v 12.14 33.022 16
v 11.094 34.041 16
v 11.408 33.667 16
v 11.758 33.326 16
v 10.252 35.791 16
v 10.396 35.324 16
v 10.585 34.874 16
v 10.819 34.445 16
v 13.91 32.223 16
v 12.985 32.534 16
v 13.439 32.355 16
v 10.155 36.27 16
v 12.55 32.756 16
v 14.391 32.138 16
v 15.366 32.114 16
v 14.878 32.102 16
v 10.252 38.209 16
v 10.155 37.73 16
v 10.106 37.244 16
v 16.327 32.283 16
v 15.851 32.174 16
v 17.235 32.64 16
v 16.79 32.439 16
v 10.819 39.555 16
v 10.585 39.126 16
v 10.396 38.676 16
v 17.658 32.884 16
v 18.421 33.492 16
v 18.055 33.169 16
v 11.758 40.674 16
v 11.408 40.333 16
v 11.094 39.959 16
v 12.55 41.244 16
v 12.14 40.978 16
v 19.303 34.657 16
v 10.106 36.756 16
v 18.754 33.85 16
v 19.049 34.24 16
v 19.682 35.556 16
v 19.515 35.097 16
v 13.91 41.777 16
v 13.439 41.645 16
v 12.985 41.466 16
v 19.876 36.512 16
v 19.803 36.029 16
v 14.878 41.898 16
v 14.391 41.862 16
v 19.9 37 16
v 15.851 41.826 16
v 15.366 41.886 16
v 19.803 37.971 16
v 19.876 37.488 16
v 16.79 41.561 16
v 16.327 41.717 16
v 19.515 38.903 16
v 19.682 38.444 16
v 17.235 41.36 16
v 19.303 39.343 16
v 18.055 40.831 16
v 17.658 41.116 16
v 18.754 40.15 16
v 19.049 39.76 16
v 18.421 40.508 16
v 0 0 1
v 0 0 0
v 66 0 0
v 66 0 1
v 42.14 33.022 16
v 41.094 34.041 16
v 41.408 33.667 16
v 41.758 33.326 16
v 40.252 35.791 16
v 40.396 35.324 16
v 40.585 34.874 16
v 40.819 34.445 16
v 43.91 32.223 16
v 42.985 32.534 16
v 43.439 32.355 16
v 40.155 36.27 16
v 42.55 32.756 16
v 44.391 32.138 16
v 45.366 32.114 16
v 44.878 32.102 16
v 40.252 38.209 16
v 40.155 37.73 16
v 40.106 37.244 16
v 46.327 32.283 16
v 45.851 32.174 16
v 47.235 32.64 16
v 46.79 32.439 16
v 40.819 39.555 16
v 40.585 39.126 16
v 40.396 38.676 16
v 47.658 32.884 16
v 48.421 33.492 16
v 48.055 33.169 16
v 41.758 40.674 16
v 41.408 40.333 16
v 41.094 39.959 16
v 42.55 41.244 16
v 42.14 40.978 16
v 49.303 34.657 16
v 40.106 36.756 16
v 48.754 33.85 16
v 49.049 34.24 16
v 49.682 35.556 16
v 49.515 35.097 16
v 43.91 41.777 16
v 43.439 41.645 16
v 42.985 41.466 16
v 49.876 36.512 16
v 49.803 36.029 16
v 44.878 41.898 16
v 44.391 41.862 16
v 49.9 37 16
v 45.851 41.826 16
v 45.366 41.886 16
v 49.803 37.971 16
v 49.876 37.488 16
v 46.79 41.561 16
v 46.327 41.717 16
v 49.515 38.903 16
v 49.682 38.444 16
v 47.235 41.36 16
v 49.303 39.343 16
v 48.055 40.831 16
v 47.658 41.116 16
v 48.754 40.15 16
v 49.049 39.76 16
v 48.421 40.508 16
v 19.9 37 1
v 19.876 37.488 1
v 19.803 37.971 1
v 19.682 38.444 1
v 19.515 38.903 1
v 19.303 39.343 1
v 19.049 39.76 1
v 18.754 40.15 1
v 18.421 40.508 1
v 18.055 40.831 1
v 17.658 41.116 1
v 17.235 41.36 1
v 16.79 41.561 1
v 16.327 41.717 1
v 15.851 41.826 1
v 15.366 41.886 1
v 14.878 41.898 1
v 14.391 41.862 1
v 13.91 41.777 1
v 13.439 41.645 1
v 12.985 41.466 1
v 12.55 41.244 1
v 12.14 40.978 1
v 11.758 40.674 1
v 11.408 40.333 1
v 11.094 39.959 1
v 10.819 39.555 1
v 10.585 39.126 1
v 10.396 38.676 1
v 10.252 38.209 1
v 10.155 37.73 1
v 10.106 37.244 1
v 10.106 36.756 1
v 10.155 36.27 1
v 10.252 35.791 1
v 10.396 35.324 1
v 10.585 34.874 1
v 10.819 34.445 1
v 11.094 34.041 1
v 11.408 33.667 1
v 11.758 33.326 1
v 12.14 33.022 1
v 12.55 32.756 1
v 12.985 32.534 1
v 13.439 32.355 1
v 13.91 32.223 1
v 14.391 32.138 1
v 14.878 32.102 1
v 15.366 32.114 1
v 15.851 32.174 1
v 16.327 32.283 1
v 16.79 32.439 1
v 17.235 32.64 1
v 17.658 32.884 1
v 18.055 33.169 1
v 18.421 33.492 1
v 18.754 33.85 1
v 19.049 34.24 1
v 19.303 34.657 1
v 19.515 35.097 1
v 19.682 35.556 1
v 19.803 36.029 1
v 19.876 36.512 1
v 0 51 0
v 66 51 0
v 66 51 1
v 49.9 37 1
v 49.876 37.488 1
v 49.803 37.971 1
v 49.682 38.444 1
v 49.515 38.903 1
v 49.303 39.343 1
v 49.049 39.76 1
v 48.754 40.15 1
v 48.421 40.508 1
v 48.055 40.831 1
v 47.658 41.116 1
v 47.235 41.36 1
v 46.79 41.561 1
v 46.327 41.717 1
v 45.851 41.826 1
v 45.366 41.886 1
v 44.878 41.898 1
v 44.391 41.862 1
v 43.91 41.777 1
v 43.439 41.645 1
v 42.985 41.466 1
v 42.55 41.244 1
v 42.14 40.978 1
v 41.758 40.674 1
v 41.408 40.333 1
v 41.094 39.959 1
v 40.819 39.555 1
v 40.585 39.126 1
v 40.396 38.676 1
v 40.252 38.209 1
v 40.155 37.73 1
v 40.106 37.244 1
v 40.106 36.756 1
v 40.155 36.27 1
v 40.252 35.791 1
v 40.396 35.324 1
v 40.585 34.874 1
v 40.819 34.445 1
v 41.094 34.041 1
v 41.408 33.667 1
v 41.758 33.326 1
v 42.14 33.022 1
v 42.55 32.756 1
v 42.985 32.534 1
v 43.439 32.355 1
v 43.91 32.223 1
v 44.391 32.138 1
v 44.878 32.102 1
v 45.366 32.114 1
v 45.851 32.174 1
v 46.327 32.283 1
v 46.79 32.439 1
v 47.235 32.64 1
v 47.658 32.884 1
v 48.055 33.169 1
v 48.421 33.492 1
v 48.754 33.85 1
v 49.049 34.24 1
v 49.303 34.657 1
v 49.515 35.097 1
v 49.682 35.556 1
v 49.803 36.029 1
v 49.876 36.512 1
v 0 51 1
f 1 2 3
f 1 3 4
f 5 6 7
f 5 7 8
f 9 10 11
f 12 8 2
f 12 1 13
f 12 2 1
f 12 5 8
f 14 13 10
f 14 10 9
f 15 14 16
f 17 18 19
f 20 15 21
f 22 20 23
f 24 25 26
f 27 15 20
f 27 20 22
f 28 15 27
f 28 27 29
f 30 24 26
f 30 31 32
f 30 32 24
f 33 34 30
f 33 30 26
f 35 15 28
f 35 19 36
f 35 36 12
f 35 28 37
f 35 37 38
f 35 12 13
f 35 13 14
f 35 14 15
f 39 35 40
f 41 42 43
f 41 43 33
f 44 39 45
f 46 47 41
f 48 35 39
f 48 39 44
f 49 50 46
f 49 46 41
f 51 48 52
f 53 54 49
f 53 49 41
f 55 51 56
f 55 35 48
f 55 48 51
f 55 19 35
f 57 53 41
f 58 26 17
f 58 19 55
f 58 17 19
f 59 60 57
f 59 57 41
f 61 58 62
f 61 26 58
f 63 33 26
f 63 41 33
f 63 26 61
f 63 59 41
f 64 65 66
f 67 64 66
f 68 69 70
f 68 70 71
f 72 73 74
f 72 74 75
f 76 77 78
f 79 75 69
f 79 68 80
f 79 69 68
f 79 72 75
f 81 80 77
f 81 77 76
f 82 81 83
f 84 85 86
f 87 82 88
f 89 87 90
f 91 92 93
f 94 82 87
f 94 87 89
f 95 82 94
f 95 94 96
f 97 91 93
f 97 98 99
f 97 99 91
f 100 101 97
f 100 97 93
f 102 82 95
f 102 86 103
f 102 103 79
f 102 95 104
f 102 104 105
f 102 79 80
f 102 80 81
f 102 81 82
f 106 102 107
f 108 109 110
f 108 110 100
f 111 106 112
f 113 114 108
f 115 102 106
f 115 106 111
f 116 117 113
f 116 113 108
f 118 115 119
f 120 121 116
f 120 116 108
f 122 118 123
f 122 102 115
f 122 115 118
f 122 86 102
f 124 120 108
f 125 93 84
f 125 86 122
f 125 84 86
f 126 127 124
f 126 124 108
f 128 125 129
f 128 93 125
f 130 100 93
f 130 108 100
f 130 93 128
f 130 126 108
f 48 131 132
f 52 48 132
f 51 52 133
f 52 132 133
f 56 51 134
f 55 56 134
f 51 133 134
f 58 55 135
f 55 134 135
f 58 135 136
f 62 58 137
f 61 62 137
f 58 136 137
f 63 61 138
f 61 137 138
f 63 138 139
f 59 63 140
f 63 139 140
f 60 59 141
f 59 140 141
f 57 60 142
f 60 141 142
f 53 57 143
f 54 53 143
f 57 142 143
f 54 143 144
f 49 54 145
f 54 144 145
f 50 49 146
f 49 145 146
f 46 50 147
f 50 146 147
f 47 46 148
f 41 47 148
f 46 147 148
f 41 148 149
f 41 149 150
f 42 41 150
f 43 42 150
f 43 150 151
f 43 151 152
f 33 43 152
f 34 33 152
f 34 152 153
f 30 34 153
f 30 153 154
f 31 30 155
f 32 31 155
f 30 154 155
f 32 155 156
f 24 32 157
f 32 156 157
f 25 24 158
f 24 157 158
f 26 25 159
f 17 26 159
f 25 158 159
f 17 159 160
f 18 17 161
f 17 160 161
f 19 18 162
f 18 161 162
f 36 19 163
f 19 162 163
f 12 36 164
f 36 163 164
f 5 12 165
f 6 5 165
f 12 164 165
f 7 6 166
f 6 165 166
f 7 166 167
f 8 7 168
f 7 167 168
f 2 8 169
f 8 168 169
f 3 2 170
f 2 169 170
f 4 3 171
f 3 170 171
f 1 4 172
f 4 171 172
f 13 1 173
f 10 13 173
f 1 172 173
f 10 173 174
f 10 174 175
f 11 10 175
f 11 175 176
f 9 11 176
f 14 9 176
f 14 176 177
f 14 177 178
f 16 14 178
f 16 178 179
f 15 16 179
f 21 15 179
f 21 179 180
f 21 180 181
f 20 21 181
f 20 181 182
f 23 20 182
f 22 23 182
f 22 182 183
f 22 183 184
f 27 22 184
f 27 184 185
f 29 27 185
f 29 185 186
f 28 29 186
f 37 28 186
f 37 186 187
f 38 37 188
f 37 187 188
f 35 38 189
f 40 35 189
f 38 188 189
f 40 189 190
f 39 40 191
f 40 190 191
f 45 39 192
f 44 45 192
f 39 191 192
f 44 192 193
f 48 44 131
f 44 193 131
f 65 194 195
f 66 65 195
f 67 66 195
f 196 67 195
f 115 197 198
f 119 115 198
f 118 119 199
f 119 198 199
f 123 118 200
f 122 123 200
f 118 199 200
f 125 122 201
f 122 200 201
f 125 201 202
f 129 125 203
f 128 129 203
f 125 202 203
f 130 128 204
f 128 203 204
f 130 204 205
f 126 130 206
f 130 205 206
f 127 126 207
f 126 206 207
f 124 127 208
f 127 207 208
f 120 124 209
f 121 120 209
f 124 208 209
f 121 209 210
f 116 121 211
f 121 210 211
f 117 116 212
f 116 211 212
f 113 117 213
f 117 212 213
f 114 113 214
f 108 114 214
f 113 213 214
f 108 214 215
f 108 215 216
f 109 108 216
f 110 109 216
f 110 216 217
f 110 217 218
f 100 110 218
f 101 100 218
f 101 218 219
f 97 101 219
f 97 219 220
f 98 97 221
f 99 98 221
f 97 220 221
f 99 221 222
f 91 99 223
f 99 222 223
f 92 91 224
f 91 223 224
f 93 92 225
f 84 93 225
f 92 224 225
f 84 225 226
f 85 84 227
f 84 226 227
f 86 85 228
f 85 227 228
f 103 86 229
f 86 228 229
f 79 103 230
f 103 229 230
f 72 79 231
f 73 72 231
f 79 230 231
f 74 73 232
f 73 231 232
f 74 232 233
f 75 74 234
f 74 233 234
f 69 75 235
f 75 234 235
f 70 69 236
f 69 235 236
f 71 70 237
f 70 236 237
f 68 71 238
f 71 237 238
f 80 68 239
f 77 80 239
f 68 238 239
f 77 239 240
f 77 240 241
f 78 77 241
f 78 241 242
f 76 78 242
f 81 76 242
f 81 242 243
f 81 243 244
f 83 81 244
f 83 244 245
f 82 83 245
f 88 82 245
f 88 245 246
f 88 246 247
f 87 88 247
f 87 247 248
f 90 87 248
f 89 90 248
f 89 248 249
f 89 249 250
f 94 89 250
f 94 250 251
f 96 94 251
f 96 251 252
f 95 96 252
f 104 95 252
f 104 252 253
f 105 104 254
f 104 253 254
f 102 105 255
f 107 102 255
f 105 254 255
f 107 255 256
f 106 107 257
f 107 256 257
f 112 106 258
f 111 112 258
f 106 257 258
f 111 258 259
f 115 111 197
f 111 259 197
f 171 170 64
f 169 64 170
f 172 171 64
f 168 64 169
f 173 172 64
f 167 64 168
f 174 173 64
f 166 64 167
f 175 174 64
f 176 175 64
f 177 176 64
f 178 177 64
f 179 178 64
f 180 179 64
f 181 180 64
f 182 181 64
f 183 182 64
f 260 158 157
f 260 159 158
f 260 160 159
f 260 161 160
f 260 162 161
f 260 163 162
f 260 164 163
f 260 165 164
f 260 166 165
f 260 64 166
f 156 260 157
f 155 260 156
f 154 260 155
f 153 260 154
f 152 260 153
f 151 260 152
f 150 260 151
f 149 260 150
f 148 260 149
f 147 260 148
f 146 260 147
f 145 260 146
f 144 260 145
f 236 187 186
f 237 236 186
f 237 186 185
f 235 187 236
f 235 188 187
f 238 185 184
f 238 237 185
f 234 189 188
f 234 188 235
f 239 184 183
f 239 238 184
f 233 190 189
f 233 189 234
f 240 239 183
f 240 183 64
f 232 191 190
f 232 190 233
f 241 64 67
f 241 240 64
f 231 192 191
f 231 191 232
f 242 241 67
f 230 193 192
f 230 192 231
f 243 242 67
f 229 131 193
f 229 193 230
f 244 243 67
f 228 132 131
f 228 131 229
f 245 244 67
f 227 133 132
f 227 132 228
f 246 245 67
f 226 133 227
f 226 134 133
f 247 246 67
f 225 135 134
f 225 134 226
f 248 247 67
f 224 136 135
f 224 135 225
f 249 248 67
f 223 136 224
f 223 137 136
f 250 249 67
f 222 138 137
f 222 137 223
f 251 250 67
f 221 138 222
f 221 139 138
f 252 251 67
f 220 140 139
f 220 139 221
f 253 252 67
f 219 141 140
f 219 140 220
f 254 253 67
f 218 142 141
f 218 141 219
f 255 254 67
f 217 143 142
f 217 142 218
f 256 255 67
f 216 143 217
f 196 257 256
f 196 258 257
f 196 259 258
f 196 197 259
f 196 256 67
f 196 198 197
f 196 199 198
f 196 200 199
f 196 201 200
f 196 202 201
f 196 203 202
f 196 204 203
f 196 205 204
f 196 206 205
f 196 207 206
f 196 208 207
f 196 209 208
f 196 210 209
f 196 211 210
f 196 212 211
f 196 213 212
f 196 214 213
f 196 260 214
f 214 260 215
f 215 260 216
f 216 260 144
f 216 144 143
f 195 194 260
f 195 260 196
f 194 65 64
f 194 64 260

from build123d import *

# Parameters (mm, degrees)
ESQUISSE2_W        = 66
ESQUISSE2_H        = 51
ESQUISSE2_R        = 6
ESQUISSE2_W_2      = 20
ESQUISSE2_H_2      = 41
ESQUISSE2_R_2      = 4.9
BOSS_EXTRU_1_DEPTH = 1
ESQUISSE4_R        = 4.9
BOSS_EXTRU_2_DEPTH = 15


with BuildPart() as part:
    # Esquisse2 → Boss.-Extru.1 (new body)
    # profile 1 of 5: a face of its own
    with BuildSketch(Plane.XY):
        with Locations((33, 25.5)):
            Rectangle(ESQUISSE2_W, ESQUISSE2_H)
        with Locations((55, 37)):
            Circle(ESQUISSE2_R, mode=Mode.SUBTRACT)
        with Locations((15, 25.5)):
            Rectangle(ESQUISSE2_W_2, ESQUISSE2_H_2, mode=Mode.SUBTRACT)
    # profile 2 of 5: a face of its own
    with BuildSketch(Plane.XY):
        with Locations((15, 25.5)):
            Rectangle(ESQUISSE2_W_2, ESQUISSE2_H_2)
        with Locations((15, 37)):
            Circle(ESQUISSE2_R_2, mode=Mode.SUBTRACT)
    # profile 3 of 5: a face of its own
    with BuildSketch(Plane.XY):
        with Locations((15, 37)):
            Circle(ESQUISSE2_R_2)
    # profile 4 of 5: a face of its own
    with BuildSketch(Plane.XY):
        with Locations((55, 37)):
            Circle(ESQUISSE2_R)
        with Locations((55, 37)):
            Circle(ESQUISSE2_R_2, mode=Mode.SUBTRACT)
    # profile 5 of 5: a face of its own
    with BuildSketch(Plane.XY):
        with Locations((55, 37)):
            Circle(ESQUISSE2_R_2)
    extrude(amount=BOSS_EXTRU_1_DEPTH)

    # Esquisse4 → Boss.-Extru.2 (add)
    with BuildSketch(Plane.XY.offset(1)):
        with Locations((15, 37)):
            Circle(ESQUISSE4_R)
        with Locations((45, 37)):
            Circle(ESQUISSE4_R)
    extrude(amount=BOSS_EXTRU_2_DEPTH)


solid = part.part
